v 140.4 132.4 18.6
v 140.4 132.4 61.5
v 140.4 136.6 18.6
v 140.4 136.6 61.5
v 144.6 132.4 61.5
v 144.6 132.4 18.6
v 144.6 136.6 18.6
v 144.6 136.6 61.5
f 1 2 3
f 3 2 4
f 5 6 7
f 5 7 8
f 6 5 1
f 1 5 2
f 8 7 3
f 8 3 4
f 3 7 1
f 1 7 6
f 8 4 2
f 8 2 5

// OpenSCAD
// Generated by the canonical parent Python sources and validated exchange pipeline.
polyhedron(points=[[140.39999389648438, 132.39999389648438, 18.600000381469727], [140.39999389648438, 132.39999389648438, 61.5], [140.39999389648438, 136.60000610351562, 18.600000381469727], [140.39999389648438, 136.60000610351562, 61.5], [144.60000610351562, 132.39999389648438, 61.5], [144.60000610351562, 132.39999389648438, 18.600000381469727], [144.60000610351562, 136.60000610351562, 18.600000381469727], [144.60000610351562, 136.60000610351562, 61.5]],faces=[[2, 1, 0], [3, 1, 2], [6, 5, 4], [7, 6, 4], [0, 4, 5], [1, 4, 0], [2, 6, 7], [3, 2, 7], [0, 6, 2], [5, 6, 0], [1, 3, 7], [4, 1, 7]],convexity=10);
